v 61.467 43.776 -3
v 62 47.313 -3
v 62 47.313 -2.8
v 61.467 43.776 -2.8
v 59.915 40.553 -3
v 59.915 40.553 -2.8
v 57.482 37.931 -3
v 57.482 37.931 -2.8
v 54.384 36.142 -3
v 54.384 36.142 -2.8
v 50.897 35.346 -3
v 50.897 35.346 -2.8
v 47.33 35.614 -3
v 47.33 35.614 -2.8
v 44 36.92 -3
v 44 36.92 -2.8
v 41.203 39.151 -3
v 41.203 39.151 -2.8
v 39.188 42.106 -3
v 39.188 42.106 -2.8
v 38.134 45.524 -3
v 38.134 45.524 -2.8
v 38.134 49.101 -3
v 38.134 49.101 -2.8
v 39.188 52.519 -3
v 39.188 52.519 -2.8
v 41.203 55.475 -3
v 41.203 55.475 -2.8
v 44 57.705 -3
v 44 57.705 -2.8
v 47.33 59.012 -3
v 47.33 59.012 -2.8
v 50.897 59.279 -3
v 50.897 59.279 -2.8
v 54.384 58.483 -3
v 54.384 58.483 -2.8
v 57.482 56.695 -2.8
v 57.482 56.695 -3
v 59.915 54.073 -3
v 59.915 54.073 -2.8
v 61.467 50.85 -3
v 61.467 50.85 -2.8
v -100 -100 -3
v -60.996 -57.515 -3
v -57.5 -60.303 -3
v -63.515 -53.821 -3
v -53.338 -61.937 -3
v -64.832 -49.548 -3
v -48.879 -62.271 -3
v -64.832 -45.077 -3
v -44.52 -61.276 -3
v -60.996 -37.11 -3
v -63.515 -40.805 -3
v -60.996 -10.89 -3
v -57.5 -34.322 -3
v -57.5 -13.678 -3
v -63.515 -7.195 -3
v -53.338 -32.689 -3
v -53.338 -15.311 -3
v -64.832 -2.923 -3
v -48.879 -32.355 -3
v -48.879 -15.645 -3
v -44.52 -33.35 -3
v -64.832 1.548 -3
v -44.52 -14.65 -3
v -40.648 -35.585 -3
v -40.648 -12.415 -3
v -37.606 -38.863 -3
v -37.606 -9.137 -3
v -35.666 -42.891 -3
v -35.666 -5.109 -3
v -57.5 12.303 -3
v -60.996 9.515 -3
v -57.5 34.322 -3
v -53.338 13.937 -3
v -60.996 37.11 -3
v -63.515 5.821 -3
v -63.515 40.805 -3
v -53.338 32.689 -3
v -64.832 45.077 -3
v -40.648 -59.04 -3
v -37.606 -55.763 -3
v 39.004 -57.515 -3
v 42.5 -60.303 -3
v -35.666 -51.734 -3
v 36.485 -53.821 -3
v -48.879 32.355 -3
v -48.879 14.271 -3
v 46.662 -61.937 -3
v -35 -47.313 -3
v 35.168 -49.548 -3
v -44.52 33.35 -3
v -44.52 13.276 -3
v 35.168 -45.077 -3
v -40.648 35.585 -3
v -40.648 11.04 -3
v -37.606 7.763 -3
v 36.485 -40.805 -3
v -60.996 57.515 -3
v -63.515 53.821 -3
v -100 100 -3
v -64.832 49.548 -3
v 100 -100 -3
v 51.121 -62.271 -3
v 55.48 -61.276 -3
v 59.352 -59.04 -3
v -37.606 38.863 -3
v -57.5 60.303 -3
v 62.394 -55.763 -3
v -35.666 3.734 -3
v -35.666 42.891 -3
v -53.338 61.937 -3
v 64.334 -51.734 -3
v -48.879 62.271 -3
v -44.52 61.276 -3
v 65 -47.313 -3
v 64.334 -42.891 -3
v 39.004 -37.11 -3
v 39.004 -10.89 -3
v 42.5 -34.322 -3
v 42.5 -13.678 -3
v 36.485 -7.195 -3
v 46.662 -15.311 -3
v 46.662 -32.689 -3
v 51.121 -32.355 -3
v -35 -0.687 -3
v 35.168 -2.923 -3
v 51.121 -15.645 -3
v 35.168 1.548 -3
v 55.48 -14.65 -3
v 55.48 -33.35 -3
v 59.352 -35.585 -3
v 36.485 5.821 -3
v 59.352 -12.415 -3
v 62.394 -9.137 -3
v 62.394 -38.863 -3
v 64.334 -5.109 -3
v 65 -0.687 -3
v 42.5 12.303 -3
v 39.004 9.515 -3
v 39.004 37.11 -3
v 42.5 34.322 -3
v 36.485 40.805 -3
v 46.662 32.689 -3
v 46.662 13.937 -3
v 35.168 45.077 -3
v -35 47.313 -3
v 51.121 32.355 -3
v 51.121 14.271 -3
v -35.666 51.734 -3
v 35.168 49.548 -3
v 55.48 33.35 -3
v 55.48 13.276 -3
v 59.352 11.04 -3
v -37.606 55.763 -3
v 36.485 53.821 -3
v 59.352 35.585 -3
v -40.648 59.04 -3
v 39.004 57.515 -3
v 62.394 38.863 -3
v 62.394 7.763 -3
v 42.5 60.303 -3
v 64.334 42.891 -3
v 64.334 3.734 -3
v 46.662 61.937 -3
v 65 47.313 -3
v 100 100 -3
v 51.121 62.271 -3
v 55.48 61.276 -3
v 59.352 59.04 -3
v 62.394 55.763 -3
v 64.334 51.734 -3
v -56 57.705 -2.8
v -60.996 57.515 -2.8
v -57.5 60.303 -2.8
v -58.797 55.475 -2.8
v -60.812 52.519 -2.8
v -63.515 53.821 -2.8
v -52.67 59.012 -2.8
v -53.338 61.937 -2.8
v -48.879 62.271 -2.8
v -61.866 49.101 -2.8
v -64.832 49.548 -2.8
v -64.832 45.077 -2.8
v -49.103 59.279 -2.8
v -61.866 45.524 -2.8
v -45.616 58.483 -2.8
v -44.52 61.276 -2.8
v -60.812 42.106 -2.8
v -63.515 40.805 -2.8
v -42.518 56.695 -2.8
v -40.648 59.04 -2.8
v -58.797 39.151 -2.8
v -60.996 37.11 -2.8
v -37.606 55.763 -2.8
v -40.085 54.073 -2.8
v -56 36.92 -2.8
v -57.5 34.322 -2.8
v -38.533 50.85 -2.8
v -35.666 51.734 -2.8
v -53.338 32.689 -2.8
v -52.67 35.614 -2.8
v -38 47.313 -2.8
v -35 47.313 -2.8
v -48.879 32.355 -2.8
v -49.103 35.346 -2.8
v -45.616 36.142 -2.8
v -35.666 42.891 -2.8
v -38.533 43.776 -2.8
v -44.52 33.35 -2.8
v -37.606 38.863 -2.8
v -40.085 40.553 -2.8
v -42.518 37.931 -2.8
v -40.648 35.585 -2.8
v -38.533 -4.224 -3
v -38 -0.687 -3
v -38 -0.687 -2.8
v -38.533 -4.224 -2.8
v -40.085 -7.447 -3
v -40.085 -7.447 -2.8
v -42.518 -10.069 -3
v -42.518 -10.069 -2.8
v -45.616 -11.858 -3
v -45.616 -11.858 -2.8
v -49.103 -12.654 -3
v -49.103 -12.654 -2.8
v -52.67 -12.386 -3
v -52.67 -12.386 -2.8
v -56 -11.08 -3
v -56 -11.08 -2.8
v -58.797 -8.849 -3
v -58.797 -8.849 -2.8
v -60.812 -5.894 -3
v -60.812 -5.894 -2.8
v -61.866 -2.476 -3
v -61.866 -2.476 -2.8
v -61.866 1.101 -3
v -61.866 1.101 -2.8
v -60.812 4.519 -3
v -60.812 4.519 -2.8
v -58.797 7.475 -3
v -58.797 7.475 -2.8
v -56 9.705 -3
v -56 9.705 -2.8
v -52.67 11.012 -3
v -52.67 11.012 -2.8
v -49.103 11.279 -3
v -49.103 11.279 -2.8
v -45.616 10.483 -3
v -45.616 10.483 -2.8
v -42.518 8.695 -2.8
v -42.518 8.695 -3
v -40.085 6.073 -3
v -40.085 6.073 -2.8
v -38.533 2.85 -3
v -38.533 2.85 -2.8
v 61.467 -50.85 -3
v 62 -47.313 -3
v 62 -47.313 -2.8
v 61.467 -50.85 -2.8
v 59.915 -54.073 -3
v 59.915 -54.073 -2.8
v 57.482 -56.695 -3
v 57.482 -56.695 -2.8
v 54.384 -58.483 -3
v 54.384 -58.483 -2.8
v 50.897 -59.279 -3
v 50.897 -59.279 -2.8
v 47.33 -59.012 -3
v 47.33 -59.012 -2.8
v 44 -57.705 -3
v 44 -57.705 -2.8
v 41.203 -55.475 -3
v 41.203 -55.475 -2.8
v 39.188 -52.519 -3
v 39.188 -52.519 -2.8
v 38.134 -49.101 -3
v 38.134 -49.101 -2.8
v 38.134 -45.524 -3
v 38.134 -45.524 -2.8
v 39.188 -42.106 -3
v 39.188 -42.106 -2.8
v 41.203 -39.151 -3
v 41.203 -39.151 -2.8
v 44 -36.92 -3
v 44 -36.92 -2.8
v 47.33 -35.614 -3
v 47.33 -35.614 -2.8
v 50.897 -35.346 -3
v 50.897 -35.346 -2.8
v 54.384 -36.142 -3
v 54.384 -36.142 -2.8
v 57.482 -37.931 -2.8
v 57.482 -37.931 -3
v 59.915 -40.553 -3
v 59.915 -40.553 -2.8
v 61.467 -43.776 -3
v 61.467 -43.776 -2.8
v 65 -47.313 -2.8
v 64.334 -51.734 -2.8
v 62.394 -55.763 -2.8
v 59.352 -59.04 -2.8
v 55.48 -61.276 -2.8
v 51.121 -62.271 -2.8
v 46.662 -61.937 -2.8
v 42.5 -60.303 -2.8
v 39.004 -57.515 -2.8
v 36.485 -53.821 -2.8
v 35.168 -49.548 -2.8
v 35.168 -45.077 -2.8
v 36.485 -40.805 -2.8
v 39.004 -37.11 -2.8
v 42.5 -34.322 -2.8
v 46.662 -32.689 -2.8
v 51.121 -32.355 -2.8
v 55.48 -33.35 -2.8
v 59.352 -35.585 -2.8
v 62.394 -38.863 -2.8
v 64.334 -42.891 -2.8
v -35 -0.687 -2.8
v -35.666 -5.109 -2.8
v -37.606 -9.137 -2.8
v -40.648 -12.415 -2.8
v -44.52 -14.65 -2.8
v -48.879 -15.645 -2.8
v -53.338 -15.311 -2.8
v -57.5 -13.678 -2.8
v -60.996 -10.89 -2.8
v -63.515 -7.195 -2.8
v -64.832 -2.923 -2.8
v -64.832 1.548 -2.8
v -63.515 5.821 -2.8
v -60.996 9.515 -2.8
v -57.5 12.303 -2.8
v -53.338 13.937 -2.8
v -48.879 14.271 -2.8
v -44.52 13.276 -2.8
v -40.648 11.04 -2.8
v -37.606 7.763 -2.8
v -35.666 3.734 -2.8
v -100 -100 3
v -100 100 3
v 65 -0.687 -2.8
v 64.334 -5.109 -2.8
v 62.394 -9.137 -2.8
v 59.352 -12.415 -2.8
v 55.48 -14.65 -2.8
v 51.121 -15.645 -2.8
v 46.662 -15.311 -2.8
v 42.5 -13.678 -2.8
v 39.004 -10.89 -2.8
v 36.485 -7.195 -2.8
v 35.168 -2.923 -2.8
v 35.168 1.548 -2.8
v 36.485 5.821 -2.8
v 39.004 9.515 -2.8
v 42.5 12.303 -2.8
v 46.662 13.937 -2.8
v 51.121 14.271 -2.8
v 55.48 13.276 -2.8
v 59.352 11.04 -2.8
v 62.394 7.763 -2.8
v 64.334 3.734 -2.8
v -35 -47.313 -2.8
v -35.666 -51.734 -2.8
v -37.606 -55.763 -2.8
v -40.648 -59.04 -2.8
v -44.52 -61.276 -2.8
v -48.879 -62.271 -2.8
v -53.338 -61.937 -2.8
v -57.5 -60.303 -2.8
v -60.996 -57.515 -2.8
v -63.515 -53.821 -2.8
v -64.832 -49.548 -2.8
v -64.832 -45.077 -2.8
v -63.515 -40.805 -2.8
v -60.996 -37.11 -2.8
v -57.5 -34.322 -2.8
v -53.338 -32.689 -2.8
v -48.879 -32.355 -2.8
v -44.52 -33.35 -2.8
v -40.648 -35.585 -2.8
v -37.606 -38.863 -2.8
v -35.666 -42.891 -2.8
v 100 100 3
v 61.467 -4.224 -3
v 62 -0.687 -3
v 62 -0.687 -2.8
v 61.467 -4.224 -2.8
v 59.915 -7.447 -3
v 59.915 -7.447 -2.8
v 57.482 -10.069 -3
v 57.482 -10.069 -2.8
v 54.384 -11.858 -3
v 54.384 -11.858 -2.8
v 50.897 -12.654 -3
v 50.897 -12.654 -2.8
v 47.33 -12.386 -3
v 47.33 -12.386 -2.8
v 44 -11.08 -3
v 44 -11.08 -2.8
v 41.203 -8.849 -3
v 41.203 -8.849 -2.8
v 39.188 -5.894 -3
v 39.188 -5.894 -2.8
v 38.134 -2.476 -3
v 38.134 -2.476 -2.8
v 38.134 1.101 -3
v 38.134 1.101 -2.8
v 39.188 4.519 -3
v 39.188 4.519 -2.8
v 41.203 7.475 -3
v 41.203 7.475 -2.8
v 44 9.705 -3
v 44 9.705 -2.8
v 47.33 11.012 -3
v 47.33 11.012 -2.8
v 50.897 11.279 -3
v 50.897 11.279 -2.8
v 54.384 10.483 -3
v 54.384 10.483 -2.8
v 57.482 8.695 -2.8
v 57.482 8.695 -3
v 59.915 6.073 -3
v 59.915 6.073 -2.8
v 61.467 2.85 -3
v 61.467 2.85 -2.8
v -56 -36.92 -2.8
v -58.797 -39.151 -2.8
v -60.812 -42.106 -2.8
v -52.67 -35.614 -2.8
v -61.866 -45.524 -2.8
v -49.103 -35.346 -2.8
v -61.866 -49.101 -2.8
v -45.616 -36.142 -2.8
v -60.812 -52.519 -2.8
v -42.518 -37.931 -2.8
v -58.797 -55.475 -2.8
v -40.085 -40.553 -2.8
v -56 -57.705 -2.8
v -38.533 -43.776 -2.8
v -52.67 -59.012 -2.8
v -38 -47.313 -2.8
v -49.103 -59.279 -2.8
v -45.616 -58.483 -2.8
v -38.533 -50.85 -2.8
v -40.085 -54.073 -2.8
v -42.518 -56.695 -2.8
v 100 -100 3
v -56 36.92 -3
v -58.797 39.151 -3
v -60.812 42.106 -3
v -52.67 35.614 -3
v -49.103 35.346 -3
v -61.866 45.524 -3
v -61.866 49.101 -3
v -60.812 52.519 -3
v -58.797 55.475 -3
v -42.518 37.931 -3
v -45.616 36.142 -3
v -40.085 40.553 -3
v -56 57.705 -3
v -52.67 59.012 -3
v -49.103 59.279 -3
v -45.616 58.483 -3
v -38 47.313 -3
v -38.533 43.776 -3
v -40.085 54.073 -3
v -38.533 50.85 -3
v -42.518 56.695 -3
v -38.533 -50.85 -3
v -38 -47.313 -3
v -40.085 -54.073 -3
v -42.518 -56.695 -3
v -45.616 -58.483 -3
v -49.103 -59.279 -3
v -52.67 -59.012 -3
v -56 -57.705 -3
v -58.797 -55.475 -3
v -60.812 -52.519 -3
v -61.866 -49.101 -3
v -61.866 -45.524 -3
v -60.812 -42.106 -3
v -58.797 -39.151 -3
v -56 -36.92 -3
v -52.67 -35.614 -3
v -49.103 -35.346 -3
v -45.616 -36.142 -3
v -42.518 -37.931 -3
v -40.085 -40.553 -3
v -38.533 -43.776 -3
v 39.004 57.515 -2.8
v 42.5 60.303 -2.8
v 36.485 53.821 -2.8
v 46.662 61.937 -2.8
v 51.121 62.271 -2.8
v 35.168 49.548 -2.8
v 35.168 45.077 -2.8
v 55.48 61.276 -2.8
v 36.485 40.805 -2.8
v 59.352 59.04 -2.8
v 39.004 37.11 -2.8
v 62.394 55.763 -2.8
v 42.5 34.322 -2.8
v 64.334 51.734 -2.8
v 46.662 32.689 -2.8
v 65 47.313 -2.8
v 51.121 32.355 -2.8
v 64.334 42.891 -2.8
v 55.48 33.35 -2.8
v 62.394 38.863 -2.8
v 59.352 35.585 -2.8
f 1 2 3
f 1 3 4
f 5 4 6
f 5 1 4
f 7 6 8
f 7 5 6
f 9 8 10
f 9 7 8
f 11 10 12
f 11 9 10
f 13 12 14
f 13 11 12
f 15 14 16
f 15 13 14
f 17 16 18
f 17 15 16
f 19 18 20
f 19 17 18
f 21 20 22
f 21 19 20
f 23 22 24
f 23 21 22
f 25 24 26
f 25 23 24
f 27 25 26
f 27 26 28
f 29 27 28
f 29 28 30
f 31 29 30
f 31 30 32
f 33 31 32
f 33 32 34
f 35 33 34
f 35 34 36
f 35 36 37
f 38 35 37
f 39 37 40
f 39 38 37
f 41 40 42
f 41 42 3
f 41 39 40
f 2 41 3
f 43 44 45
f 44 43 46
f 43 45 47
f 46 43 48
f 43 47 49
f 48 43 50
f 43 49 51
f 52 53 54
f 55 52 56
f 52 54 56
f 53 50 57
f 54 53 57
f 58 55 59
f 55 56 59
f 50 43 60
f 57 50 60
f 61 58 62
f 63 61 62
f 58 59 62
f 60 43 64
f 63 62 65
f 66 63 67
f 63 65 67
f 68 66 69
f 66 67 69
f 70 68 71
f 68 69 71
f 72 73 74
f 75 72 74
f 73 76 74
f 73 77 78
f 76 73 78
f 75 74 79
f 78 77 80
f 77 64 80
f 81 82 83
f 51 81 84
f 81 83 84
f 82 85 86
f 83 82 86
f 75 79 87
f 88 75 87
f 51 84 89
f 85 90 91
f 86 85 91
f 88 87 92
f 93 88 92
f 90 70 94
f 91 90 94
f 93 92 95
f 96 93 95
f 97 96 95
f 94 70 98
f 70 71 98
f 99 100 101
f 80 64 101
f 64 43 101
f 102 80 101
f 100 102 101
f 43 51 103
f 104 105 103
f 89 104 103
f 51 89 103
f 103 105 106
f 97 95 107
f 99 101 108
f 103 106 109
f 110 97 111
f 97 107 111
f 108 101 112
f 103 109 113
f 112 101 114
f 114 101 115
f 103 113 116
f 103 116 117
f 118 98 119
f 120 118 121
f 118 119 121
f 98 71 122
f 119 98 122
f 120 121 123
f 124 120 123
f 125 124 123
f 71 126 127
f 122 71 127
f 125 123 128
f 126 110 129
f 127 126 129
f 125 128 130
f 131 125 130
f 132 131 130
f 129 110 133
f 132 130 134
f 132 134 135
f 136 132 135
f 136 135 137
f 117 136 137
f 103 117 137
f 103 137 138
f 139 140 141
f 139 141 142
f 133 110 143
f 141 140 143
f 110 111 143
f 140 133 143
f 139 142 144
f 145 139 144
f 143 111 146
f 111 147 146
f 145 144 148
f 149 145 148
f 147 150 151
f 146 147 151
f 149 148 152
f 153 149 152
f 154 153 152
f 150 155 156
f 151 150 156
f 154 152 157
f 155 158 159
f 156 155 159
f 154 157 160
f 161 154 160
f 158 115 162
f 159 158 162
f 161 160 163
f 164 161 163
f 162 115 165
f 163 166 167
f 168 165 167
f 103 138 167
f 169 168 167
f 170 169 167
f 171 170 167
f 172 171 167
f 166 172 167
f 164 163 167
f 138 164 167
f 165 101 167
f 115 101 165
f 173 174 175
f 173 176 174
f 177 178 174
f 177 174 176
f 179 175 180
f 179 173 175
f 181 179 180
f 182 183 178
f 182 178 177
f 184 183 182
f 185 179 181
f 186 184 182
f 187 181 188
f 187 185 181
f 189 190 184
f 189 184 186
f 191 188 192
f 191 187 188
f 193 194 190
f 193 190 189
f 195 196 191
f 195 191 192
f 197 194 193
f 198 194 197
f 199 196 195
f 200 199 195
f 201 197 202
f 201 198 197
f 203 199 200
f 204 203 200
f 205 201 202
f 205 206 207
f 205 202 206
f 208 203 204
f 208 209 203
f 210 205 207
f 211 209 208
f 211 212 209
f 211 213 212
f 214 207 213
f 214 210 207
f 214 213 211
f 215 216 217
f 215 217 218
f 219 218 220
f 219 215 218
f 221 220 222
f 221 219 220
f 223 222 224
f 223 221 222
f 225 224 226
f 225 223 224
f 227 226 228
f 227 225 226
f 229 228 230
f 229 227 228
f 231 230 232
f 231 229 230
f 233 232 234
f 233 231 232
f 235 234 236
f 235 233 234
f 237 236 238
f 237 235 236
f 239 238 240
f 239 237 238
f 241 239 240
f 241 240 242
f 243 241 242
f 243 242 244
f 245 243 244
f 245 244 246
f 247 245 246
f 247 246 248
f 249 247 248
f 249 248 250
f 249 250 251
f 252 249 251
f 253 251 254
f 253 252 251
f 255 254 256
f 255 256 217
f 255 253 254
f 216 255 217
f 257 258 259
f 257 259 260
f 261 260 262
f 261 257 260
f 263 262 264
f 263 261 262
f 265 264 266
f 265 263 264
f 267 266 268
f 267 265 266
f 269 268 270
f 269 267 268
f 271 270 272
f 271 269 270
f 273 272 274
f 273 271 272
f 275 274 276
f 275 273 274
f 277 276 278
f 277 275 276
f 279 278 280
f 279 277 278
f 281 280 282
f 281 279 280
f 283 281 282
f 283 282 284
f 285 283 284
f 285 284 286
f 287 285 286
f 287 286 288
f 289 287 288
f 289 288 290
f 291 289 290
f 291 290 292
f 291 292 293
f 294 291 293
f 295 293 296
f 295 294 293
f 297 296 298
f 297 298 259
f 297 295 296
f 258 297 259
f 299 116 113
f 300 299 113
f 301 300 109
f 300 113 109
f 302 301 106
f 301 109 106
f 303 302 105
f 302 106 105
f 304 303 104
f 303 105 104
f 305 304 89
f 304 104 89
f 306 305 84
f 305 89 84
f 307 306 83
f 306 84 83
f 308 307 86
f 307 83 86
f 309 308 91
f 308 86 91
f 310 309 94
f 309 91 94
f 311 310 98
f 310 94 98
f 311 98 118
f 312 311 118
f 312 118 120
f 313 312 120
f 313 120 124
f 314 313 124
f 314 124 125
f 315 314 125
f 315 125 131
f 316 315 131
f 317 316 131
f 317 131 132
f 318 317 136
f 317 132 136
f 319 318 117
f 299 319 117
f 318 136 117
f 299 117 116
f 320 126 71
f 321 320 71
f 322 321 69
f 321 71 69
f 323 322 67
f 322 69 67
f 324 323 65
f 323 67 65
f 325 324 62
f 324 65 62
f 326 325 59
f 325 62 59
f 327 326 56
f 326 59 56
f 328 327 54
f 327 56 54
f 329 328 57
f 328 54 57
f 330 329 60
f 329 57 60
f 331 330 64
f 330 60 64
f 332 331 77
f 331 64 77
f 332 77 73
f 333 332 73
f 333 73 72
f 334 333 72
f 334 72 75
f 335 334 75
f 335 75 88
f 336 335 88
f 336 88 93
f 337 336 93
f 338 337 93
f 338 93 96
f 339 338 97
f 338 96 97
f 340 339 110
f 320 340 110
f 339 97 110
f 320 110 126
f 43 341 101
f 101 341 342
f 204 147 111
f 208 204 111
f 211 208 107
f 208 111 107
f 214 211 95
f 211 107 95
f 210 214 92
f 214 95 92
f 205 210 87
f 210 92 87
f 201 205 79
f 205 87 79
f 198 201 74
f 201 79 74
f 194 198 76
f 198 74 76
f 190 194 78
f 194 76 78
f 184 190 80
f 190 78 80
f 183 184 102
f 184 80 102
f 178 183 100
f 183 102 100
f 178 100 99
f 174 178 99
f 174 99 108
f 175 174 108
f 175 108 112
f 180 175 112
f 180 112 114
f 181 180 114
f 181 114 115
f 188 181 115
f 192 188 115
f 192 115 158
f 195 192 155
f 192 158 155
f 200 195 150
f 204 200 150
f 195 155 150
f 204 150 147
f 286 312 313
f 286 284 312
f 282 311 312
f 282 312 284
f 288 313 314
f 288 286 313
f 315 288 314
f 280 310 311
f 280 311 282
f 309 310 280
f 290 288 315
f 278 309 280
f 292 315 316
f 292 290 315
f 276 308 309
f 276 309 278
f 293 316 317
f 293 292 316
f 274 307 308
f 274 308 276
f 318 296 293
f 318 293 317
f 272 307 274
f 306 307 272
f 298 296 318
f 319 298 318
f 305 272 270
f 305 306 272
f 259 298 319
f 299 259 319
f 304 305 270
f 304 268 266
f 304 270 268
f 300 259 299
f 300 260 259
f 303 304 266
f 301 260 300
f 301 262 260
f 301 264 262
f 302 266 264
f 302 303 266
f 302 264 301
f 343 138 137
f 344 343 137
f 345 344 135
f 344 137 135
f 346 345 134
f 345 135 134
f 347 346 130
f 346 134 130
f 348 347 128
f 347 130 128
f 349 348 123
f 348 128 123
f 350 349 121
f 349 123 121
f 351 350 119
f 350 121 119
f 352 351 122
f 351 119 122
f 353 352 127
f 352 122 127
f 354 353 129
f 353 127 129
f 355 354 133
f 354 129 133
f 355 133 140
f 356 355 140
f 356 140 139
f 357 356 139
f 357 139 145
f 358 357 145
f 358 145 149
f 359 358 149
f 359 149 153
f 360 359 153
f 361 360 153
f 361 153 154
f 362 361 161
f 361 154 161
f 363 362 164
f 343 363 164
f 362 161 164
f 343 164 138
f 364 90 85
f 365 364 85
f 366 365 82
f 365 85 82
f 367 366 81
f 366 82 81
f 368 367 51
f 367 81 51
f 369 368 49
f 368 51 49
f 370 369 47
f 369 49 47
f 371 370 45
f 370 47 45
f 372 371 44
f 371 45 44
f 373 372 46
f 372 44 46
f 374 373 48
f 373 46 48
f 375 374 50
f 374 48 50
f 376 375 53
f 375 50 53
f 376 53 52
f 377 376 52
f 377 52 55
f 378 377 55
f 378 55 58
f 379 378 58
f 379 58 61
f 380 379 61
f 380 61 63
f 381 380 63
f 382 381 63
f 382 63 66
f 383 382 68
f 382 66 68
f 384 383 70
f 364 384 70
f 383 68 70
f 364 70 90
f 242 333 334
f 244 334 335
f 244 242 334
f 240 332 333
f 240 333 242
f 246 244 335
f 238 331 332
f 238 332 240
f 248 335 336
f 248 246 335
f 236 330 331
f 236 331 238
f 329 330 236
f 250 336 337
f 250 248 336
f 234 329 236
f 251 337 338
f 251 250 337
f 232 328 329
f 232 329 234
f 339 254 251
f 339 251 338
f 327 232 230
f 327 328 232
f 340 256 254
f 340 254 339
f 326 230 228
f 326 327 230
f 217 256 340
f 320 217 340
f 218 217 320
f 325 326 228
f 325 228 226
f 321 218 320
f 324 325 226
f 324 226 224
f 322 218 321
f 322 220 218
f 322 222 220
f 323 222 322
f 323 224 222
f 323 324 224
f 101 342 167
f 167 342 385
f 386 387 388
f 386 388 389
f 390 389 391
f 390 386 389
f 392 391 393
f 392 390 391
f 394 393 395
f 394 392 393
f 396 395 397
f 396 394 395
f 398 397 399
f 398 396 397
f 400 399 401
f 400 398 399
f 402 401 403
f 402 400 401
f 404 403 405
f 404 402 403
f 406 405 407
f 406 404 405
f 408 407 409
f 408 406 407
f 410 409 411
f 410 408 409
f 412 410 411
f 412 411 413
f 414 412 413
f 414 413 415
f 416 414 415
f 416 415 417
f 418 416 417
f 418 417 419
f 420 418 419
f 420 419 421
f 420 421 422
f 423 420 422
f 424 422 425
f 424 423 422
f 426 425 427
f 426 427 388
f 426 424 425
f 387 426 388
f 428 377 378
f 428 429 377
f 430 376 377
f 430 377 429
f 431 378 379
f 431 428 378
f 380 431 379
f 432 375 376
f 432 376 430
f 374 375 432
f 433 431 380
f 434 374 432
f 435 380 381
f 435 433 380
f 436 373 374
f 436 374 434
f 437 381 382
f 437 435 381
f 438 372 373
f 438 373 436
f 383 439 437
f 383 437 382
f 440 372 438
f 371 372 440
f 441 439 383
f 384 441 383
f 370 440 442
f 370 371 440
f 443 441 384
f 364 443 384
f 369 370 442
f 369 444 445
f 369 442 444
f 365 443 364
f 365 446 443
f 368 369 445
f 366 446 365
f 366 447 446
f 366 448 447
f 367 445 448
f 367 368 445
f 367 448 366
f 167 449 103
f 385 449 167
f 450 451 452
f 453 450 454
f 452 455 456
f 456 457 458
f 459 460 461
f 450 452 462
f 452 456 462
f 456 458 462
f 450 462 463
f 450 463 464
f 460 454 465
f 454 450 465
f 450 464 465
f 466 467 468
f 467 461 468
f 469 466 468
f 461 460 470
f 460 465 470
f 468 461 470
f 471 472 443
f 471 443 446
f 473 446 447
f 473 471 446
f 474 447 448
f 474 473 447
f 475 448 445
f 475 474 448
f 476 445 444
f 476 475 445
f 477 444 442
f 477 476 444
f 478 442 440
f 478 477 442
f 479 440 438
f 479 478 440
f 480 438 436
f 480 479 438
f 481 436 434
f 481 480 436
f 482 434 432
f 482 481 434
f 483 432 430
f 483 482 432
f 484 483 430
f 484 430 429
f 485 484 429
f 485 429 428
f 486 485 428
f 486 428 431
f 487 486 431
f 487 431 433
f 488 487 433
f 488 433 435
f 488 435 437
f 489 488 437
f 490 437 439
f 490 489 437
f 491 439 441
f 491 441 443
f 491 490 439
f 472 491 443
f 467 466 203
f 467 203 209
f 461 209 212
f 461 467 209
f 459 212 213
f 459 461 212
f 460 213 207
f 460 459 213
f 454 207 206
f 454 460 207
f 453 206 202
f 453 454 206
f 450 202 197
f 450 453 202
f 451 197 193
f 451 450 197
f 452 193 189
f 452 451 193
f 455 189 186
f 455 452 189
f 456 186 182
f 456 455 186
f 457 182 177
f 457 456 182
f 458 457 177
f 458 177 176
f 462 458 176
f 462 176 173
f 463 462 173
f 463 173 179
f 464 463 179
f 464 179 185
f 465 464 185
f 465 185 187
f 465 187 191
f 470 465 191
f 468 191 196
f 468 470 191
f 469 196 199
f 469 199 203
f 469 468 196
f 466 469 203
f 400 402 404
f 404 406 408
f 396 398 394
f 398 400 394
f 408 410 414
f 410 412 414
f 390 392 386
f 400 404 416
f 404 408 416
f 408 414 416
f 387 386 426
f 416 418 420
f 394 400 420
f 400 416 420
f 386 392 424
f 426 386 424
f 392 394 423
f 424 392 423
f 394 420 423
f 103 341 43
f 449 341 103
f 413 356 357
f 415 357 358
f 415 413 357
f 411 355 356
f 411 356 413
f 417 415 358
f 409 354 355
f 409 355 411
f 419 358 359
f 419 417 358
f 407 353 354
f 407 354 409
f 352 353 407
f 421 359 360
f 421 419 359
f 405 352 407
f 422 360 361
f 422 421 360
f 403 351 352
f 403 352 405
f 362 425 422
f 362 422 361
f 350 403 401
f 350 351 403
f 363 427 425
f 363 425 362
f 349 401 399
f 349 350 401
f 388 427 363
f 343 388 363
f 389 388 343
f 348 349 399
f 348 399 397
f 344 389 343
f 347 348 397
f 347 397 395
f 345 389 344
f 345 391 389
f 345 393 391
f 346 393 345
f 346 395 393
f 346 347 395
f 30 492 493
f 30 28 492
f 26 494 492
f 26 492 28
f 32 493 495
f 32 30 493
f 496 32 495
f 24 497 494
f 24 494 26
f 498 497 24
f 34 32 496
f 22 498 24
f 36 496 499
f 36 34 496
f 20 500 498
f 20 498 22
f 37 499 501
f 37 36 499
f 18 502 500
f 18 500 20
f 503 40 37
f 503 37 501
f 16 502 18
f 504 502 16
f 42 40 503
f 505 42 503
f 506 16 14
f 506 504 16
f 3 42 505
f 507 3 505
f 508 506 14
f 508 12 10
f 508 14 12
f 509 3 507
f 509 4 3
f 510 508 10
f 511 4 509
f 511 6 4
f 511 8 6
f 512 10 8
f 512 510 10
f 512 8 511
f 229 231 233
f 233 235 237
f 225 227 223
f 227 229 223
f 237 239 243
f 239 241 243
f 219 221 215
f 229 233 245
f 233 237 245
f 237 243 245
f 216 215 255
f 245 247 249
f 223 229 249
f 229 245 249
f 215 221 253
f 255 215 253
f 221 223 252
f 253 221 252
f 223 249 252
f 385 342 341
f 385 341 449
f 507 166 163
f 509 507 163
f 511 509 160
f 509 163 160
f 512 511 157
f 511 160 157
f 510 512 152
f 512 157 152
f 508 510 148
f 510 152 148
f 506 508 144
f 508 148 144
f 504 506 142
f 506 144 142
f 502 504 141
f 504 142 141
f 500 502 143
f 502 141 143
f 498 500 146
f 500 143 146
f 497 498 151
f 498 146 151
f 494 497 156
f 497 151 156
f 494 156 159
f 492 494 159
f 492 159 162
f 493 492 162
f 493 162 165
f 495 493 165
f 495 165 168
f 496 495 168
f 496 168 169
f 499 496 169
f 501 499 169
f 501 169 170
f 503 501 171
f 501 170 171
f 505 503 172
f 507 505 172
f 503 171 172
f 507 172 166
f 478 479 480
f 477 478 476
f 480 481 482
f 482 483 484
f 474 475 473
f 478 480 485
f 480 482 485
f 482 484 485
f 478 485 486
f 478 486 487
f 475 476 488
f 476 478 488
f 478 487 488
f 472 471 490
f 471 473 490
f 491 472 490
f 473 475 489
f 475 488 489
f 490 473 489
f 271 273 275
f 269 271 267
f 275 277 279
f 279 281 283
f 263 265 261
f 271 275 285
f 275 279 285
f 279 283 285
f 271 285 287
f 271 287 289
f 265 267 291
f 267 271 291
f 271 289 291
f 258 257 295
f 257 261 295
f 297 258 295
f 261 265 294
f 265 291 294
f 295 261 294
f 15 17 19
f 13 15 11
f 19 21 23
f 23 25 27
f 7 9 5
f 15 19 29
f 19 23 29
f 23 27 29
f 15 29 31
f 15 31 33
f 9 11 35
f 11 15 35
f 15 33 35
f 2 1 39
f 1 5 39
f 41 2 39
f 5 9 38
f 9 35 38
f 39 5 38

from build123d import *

# Parameters (mm, degrees)
F0_W     = 200
F0_H     = 200
F1_DEPTH = 3
F2_R     = 15
F2_R_2   = 12
F3_DEPTH = 0.2


with BuildPart() as f1:
    # F0 (on Top) → F1 (new body, symmetric)
    with BuildSketch(Plane.XY):
        Rectangle(F0_W, F0_H)
    extrude(amount=F1_DEPTH, both=True)

    # F2 (on face) → F3 (cut)
    with BuildSketch(Plane(origin=(0, 0, -3), x_dir=(1, 0, 0), z_dir=(0, 0, -1))):
        with Locations((-50, 47.312775)):
            Circle(F2_R)
        with Locations((-50, 47.312775)):
            Circle(F2_R_2, mode=Mode.SUBTRACT)
        with Locations((-50, 0.687225)):
            Circle(F2_R)
        with Locations((-50, 0.687225)):
            Circle(F2_R_2, mode=Mode.SUBTRACT)
        with Locations((-50, -47.312775)):
            Circle(F2_R)
        with Locations((-50, -47.312775)):
            Circle(F2_R_2, mode=Mode.SUBTRACT)
        with Locations((50, 47.312775)):
            Circle(F2_R)
        with Locations((50, 47.312775)):
            Circle(F2_R_2, mode=Mode.SUBTRACT)
        with Locations((50, 0.687225)):
            Circle(F2_R)
        with Locations((50, 0.687225)):
            Circle(F2_R_2, mode=Mode.SUBTRACT)
        with Locations((50, -47.312775)):
            Circle(F2_R)
        with Locations((50, -47.312775)):
            Circle(F2_R_2, mode=Mode.SUBTRACT)
    extrude(amount=-F3_DEPTH, mode=Mode.SUBTRACT)


solid = f1.part
